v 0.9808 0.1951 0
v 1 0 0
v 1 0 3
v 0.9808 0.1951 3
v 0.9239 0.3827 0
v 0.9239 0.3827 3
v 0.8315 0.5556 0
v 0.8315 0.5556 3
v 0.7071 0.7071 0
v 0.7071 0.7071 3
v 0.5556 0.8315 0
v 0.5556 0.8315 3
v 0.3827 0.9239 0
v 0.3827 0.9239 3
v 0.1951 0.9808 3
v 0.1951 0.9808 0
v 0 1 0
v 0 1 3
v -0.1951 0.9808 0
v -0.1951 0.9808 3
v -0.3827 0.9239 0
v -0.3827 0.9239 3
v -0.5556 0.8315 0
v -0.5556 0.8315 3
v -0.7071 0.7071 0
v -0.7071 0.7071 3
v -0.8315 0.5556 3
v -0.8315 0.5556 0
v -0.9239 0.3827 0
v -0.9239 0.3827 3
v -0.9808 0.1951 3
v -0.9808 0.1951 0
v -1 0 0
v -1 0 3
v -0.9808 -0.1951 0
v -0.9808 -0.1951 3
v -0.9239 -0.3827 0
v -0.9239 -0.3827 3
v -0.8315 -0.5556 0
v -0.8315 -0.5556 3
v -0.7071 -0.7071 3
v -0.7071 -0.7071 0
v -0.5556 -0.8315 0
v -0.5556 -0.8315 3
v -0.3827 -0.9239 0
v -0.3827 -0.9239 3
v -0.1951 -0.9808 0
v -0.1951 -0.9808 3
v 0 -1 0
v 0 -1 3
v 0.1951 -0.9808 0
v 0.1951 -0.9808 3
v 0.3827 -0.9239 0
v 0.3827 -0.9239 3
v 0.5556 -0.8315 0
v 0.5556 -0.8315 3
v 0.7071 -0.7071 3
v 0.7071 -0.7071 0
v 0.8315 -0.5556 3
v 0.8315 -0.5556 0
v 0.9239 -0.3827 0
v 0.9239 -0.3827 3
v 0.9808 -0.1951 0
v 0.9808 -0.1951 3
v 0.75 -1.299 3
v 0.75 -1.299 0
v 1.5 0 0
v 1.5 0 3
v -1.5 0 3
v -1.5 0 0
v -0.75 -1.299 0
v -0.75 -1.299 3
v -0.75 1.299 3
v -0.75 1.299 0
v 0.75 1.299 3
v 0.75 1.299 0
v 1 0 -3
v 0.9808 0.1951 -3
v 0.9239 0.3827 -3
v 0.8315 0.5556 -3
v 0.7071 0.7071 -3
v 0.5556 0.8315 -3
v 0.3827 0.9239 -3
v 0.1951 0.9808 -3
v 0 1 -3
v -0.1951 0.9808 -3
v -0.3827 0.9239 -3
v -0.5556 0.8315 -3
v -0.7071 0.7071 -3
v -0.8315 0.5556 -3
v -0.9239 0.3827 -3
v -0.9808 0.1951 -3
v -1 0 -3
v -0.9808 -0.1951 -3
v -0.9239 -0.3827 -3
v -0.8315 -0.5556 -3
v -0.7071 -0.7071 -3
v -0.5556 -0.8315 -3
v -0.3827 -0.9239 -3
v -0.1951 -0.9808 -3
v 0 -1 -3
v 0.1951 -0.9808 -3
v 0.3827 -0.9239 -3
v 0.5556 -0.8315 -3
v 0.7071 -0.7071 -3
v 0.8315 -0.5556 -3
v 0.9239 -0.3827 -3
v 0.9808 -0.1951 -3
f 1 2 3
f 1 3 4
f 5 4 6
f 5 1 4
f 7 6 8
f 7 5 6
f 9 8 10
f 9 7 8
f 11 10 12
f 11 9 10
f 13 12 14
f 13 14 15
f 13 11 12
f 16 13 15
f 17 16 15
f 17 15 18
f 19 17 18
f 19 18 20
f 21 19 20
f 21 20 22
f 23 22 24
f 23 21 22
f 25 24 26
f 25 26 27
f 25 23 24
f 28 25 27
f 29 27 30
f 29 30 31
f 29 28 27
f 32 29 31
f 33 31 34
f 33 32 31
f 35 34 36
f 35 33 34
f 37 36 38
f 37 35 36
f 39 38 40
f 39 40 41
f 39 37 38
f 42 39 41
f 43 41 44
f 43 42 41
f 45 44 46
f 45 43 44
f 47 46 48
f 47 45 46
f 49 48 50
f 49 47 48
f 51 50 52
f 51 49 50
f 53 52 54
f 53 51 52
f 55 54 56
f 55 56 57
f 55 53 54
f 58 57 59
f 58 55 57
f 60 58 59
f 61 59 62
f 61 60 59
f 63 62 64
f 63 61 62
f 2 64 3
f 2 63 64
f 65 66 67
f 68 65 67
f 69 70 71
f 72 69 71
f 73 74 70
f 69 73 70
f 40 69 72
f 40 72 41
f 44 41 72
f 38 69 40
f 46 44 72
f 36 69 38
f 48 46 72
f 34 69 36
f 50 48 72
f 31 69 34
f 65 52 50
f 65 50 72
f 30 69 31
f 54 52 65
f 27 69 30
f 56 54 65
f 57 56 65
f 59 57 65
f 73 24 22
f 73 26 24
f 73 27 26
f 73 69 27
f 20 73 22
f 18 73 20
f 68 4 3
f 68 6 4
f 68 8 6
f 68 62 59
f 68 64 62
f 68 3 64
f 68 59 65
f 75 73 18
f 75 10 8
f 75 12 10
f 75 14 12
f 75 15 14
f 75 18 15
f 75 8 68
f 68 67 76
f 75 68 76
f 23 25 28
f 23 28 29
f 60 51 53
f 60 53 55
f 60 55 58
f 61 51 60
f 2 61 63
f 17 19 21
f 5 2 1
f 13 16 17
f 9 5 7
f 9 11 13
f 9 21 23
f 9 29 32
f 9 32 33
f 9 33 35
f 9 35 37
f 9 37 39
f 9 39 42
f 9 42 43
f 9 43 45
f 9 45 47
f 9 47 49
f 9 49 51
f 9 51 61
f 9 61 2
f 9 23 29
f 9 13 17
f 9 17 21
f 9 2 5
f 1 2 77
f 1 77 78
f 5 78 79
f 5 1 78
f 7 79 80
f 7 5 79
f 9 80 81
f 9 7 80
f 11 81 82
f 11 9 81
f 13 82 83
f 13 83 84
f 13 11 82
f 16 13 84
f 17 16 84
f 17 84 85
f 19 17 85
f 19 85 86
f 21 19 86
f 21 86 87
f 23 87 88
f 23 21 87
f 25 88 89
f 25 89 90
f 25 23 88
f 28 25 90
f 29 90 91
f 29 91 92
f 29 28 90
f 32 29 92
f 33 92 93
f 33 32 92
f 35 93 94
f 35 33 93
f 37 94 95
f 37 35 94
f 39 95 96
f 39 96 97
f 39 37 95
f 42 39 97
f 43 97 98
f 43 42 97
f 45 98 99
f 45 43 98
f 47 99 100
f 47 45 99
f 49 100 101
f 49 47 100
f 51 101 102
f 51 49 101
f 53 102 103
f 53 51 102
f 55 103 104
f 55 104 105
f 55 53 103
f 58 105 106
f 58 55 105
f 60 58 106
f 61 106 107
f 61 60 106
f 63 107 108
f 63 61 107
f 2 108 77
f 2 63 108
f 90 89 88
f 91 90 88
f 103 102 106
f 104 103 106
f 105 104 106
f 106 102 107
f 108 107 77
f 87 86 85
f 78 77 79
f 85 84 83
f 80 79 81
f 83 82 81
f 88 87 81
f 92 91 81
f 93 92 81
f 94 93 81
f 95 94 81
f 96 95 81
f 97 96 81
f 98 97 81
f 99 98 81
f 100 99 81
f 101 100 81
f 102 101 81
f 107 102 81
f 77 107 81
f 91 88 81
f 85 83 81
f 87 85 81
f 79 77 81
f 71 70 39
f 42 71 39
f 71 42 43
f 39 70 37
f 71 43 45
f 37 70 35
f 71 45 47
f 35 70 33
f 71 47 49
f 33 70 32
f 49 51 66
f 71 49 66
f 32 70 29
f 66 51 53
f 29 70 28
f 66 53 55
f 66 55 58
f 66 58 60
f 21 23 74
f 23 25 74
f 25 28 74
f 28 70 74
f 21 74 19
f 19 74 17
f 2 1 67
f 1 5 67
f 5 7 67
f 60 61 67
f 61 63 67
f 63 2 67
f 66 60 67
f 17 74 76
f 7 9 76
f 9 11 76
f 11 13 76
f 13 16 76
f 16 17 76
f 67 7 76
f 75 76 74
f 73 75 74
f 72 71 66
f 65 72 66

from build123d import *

# Parameters (mm, degrees)
SKETCH_1_R      = 1
EXTRUDE_1_DEPTH = 3
SKETCH_2_R      = 1
EXTRUDE_2_DEPTH = 3


with BuildPart() as part:
    # 草图1 → 凸台-拉伸1 (new body)
    with BuildSketch(Plane.XY):
        Polygon((-1.5, 0), (-0.75, -1.299038106), (0.75, -1.299038106), (1.5, 0), (0.75, 1.299038106), (-0.75, 1.299038106), align=None)
        Circle(SKETCH_1_R, mode=Mode.SUBTRACT)
    extrude(amount=EXTRUDE_1_DEPTH)


with BuildPart() as body_2:
    # 草图2 → 凸台-拉伸2 (new body)
    with BuildSketch(Plane.XY):
        Circle(SKETCH_2_R)
    extrude(amount=-EXTRUDE_2_DEPTH)


solid = Compound([part.part, body_2.part])
